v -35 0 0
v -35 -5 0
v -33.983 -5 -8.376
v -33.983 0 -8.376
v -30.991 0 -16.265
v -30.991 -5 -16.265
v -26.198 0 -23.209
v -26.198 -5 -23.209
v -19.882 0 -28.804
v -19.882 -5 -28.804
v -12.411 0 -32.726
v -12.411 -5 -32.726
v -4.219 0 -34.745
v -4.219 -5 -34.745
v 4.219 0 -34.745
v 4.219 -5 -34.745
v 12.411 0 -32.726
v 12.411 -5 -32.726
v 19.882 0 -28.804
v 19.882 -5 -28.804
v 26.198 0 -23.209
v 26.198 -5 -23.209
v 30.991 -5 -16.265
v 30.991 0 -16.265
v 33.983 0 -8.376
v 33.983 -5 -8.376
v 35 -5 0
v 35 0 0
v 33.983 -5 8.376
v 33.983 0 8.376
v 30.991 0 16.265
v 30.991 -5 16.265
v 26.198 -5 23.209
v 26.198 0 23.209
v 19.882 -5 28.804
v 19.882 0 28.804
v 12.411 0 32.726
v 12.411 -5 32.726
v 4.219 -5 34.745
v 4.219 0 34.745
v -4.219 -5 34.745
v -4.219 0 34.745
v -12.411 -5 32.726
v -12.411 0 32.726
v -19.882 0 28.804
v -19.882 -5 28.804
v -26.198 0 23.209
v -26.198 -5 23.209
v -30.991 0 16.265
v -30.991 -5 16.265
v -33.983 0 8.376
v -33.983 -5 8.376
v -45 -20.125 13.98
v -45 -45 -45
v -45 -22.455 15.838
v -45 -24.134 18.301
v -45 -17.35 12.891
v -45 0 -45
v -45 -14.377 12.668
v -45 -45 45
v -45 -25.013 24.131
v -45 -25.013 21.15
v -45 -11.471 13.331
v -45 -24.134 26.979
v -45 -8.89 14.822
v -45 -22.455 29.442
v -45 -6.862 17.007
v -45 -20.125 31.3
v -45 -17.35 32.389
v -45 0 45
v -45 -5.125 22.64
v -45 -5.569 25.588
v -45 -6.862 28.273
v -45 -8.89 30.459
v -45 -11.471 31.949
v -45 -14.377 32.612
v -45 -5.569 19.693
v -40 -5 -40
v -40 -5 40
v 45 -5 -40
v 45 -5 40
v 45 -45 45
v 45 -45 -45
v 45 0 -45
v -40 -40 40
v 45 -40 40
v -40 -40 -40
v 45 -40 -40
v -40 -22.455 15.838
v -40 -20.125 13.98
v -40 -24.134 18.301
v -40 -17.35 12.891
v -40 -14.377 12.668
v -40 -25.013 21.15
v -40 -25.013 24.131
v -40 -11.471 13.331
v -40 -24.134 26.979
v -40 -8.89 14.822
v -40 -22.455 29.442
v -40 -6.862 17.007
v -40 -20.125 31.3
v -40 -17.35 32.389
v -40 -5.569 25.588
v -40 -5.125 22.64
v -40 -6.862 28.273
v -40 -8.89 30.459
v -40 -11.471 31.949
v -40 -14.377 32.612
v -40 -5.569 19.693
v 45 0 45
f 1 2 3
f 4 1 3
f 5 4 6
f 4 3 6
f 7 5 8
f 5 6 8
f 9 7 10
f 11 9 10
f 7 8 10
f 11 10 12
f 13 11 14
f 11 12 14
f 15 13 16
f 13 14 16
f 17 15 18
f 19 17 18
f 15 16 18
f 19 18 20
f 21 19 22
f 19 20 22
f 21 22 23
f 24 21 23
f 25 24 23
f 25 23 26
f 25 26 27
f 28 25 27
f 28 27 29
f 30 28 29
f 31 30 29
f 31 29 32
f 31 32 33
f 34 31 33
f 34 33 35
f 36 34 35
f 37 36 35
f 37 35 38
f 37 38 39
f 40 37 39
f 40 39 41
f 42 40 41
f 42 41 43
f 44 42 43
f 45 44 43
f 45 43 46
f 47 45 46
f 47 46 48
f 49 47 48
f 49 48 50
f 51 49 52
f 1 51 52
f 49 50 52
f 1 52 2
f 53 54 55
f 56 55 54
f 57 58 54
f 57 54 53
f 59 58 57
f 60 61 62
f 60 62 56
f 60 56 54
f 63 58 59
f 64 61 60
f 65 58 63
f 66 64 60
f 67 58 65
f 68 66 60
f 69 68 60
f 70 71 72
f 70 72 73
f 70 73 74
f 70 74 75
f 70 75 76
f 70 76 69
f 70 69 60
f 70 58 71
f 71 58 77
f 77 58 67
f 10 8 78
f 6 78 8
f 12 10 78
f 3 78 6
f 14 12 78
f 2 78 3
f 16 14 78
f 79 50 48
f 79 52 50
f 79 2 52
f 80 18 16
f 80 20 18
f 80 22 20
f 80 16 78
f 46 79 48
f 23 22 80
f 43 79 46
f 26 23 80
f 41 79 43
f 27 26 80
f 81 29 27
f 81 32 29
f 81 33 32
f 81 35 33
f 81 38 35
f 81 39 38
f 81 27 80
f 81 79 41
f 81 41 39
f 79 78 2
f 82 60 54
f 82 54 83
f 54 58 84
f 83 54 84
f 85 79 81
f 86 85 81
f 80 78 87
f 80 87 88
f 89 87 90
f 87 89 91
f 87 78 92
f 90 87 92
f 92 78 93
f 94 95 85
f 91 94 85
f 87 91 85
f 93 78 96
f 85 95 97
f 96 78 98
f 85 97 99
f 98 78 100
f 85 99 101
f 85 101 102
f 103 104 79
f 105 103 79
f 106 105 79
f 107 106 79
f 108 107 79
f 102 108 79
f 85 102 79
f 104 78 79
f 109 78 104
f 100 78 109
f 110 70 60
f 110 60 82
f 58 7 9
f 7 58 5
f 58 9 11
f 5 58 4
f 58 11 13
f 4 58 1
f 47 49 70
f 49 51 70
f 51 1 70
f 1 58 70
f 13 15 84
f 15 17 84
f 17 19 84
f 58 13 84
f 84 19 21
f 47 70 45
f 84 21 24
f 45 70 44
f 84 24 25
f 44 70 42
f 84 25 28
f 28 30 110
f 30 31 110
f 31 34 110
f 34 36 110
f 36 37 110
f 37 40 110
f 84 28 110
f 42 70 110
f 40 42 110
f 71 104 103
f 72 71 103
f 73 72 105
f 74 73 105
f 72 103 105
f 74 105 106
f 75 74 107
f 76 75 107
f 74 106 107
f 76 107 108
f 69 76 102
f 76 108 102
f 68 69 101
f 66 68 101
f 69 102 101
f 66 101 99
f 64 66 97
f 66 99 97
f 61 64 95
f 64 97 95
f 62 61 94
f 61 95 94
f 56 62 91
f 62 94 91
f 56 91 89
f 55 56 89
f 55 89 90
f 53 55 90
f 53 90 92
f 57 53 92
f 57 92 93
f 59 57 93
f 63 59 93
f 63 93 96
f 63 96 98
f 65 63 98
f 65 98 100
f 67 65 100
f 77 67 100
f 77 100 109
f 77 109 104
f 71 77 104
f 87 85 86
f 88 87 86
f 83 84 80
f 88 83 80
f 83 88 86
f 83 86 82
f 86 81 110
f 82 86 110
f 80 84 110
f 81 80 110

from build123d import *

# Parameters (mm, degrees)
F0_W     = 90
F0_H     = 90
F1_DEPTH = 45
F2_T     = -5
F3_D     = 70
F3_DEPTH = 10
F3_TIP   = 21.030121666
F6_D     = 20
F6_DEPTH = 12
F6_TIP   = 6.0086061903


with BuildPart() as f1:
    # F0 (on Front) → F1 (new body)
    with BuildSketch(Plane.XZ):
        Rectangle(F0_W, F0_H)
    extrude(amount=F1_DEPTH)

    # F2
    f2_openings = [f1.faces().sort_by_distance(p)[0] for p in [
        (45, -22.5, 0),
    ]]
    offset(amount=F2_T, openings=f2_openings)

    # F3
    with Locations(Plane(origin=(0, 0, 0), x_dir=(1, 0, 0), z_dir=(0, 1, 0))):
        with Locations((0, 0)):
            Hole(F3_D / 2, depth=F3_DEPTH)
            with Locations((0, 0, -(F3_DEPTH + F3_TIP / 2))):  # 118° drill point
                Cone(0, F3_D / 2, F3_TIP, mode=Mode.SUBTRACT)

    # F6
    with Locations(Plane(origin=(-45, 0, 0), x_dir=(0, -1, 0), z_dir=(-1, 0, 0))):
        with Locations((15.1247903705, 22.6402059197)):
            Hole(F6_D / 2, depth=F6_DEPTH)
            with Locations((0, 0, -(F6_DEPTH + F6_TIP / 2))):  # 118° drill point
                Cone(0, F6_D / 2, F6_TIP, mode=Mode.SUBTRACT)


solid = f1.part
